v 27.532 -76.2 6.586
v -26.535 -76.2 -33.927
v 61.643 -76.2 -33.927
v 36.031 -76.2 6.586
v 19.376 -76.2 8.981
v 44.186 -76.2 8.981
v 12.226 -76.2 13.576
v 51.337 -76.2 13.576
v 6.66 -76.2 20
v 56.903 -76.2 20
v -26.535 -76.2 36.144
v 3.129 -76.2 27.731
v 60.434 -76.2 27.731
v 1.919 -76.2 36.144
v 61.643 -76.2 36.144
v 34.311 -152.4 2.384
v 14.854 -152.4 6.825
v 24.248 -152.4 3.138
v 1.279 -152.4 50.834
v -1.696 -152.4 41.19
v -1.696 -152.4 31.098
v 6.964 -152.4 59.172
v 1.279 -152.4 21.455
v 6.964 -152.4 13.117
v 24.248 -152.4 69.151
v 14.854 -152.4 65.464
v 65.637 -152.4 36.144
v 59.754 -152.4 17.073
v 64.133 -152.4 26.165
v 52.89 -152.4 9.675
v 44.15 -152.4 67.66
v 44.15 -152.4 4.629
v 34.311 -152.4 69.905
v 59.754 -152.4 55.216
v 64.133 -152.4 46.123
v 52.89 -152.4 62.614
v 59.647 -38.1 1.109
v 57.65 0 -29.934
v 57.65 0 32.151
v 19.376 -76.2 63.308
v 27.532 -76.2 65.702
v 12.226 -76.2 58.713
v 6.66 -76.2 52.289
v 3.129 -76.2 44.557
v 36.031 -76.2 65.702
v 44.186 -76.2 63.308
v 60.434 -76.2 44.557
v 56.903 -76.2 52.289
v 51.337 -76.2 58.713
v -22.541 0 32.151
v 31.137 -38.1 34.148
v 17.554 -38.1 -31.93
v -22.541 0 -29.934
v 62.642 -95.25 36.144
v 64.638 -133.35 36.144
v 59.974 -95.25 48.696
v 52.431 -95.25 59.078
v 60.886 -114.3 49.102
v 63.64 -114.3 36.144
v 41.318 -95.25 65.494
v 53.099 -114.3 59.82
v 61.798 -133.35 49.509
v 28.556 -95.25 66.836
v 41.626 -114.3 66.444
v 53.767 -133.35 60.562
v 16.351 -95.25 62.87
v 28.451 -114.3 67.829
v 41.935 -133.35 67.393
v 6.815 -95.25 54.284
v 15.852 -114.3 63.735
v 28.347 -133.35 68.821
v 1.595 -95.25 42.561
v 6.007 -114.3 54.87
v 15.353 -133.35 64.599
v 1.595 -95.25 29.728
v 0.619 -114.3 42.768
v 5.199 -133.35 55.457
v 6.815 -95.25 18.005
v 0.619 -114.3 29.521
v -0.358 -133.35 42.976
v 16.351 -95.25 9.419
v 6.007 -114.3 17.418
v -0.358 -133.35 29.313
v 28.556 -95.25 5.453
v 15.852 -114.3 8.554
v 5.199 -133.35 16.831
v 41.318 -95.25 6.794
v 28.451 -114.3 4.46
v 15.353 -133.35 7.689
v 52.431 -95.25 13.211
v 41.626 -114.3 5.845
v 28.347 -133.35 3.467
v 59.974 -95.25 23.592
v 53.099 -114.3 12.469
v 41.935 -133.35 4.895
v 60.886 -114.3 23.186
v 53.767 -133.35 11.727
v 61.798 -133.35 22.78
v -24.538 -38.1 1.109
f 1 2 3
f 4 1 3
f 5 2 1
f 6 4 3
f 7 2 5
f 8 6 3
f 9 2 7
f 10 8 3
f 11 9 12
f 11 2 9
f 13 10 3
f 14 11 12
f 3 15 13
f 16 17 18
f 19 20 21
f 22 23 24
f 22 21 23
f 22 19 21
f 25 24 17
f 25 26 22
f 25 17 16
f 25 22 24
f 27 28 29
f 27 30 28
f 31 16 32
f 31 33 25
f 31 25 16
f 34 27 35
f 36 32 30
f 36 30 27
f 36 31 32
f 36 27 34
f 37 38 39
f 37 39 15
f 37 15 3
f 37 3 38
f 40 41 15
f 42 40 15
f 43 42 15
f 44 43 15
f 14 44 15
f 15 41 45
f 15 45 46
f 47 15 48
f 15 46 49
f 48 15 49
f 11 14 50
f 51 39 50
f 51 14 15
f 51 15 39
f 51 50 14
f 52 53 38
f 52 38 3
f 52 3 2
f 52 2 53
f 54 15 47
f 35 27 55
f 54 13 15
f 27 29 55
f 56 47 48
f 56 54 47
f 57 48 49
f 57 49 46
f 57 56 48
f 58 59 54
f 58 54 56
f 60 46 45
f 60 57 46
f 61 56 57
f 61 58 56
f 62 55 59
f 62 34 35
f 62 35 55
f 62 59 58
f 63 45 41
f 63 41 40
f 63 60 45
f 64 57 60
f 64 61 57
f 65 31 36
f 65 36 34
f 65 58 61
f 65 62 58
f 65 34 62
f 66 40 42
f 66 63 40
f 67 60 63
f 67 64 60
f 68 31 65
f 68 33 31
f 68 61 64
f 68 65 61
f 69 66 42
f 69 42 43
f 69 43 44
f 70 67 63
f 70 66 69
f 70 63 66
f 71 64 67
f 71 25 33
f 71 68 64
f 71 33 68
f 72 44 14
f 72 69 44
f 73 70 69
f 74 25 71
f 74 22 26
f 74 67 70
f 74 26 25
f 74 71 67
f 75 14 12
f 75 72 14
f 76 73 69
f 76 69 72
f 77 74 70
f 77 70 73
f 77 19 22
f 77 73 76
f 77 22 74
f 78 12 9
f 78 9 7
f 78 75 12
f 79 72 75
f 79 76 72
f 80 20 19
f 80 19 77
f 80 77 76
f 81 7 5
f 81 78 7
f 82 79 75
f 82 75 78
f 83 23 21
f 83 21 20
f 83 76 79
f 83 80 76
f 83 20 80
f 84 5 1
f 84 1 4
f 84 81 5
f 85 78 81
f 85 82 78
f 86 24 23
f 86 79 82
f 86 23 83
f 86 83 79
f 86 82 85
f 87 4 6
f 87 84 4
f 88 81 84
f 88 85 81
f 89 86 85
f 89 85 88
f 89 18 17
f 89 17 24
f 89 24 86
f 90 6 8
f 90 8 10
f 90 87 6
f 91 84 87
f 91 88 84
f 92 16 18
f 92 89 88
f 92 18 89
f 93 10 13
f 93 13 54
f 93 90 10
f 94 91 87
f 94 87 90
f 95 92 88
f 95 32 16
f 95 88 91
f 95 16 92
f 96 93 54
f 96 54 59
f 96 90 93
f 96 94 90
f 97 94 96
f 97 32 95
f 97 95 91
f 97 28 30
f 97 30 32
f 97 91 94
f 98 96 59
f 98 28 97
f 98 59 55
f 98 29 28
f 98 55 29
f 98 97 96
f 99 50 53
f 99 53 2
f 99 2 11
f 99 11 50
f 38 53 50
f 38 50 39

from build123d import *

# Parameters (mm, degrees)
F0_W     = 80.1909789443
F0_H     = 62.0844513178
F1_DEPTH = 76.2
F1_TAPER = -3
F2_R     = 29.8619780209
F3_DEPTH = 76.2
F3_TAPER = -3


with BuildPart() as f1:
    # F0 (on Front) → F1 (new body)
    with BuildSketch(Plane.XZ):
        with Locations((17.5543613732, 1.1086538434)):
            Rectangle(F0_W, F0_H)
    extrude(amount=F1_DEPTH, taper=F1_TAPER)

    # F2 (on face) → F3 (join)
    with BuildSketch(Plane.XZ.offset(76.2)):
        with Locations((31.7813456059, 36.1443522837)):
            Circle(F2_R)
    extrude(amount=F3_DEPTH, taper=F3_TAPER)


solid = f1.part
